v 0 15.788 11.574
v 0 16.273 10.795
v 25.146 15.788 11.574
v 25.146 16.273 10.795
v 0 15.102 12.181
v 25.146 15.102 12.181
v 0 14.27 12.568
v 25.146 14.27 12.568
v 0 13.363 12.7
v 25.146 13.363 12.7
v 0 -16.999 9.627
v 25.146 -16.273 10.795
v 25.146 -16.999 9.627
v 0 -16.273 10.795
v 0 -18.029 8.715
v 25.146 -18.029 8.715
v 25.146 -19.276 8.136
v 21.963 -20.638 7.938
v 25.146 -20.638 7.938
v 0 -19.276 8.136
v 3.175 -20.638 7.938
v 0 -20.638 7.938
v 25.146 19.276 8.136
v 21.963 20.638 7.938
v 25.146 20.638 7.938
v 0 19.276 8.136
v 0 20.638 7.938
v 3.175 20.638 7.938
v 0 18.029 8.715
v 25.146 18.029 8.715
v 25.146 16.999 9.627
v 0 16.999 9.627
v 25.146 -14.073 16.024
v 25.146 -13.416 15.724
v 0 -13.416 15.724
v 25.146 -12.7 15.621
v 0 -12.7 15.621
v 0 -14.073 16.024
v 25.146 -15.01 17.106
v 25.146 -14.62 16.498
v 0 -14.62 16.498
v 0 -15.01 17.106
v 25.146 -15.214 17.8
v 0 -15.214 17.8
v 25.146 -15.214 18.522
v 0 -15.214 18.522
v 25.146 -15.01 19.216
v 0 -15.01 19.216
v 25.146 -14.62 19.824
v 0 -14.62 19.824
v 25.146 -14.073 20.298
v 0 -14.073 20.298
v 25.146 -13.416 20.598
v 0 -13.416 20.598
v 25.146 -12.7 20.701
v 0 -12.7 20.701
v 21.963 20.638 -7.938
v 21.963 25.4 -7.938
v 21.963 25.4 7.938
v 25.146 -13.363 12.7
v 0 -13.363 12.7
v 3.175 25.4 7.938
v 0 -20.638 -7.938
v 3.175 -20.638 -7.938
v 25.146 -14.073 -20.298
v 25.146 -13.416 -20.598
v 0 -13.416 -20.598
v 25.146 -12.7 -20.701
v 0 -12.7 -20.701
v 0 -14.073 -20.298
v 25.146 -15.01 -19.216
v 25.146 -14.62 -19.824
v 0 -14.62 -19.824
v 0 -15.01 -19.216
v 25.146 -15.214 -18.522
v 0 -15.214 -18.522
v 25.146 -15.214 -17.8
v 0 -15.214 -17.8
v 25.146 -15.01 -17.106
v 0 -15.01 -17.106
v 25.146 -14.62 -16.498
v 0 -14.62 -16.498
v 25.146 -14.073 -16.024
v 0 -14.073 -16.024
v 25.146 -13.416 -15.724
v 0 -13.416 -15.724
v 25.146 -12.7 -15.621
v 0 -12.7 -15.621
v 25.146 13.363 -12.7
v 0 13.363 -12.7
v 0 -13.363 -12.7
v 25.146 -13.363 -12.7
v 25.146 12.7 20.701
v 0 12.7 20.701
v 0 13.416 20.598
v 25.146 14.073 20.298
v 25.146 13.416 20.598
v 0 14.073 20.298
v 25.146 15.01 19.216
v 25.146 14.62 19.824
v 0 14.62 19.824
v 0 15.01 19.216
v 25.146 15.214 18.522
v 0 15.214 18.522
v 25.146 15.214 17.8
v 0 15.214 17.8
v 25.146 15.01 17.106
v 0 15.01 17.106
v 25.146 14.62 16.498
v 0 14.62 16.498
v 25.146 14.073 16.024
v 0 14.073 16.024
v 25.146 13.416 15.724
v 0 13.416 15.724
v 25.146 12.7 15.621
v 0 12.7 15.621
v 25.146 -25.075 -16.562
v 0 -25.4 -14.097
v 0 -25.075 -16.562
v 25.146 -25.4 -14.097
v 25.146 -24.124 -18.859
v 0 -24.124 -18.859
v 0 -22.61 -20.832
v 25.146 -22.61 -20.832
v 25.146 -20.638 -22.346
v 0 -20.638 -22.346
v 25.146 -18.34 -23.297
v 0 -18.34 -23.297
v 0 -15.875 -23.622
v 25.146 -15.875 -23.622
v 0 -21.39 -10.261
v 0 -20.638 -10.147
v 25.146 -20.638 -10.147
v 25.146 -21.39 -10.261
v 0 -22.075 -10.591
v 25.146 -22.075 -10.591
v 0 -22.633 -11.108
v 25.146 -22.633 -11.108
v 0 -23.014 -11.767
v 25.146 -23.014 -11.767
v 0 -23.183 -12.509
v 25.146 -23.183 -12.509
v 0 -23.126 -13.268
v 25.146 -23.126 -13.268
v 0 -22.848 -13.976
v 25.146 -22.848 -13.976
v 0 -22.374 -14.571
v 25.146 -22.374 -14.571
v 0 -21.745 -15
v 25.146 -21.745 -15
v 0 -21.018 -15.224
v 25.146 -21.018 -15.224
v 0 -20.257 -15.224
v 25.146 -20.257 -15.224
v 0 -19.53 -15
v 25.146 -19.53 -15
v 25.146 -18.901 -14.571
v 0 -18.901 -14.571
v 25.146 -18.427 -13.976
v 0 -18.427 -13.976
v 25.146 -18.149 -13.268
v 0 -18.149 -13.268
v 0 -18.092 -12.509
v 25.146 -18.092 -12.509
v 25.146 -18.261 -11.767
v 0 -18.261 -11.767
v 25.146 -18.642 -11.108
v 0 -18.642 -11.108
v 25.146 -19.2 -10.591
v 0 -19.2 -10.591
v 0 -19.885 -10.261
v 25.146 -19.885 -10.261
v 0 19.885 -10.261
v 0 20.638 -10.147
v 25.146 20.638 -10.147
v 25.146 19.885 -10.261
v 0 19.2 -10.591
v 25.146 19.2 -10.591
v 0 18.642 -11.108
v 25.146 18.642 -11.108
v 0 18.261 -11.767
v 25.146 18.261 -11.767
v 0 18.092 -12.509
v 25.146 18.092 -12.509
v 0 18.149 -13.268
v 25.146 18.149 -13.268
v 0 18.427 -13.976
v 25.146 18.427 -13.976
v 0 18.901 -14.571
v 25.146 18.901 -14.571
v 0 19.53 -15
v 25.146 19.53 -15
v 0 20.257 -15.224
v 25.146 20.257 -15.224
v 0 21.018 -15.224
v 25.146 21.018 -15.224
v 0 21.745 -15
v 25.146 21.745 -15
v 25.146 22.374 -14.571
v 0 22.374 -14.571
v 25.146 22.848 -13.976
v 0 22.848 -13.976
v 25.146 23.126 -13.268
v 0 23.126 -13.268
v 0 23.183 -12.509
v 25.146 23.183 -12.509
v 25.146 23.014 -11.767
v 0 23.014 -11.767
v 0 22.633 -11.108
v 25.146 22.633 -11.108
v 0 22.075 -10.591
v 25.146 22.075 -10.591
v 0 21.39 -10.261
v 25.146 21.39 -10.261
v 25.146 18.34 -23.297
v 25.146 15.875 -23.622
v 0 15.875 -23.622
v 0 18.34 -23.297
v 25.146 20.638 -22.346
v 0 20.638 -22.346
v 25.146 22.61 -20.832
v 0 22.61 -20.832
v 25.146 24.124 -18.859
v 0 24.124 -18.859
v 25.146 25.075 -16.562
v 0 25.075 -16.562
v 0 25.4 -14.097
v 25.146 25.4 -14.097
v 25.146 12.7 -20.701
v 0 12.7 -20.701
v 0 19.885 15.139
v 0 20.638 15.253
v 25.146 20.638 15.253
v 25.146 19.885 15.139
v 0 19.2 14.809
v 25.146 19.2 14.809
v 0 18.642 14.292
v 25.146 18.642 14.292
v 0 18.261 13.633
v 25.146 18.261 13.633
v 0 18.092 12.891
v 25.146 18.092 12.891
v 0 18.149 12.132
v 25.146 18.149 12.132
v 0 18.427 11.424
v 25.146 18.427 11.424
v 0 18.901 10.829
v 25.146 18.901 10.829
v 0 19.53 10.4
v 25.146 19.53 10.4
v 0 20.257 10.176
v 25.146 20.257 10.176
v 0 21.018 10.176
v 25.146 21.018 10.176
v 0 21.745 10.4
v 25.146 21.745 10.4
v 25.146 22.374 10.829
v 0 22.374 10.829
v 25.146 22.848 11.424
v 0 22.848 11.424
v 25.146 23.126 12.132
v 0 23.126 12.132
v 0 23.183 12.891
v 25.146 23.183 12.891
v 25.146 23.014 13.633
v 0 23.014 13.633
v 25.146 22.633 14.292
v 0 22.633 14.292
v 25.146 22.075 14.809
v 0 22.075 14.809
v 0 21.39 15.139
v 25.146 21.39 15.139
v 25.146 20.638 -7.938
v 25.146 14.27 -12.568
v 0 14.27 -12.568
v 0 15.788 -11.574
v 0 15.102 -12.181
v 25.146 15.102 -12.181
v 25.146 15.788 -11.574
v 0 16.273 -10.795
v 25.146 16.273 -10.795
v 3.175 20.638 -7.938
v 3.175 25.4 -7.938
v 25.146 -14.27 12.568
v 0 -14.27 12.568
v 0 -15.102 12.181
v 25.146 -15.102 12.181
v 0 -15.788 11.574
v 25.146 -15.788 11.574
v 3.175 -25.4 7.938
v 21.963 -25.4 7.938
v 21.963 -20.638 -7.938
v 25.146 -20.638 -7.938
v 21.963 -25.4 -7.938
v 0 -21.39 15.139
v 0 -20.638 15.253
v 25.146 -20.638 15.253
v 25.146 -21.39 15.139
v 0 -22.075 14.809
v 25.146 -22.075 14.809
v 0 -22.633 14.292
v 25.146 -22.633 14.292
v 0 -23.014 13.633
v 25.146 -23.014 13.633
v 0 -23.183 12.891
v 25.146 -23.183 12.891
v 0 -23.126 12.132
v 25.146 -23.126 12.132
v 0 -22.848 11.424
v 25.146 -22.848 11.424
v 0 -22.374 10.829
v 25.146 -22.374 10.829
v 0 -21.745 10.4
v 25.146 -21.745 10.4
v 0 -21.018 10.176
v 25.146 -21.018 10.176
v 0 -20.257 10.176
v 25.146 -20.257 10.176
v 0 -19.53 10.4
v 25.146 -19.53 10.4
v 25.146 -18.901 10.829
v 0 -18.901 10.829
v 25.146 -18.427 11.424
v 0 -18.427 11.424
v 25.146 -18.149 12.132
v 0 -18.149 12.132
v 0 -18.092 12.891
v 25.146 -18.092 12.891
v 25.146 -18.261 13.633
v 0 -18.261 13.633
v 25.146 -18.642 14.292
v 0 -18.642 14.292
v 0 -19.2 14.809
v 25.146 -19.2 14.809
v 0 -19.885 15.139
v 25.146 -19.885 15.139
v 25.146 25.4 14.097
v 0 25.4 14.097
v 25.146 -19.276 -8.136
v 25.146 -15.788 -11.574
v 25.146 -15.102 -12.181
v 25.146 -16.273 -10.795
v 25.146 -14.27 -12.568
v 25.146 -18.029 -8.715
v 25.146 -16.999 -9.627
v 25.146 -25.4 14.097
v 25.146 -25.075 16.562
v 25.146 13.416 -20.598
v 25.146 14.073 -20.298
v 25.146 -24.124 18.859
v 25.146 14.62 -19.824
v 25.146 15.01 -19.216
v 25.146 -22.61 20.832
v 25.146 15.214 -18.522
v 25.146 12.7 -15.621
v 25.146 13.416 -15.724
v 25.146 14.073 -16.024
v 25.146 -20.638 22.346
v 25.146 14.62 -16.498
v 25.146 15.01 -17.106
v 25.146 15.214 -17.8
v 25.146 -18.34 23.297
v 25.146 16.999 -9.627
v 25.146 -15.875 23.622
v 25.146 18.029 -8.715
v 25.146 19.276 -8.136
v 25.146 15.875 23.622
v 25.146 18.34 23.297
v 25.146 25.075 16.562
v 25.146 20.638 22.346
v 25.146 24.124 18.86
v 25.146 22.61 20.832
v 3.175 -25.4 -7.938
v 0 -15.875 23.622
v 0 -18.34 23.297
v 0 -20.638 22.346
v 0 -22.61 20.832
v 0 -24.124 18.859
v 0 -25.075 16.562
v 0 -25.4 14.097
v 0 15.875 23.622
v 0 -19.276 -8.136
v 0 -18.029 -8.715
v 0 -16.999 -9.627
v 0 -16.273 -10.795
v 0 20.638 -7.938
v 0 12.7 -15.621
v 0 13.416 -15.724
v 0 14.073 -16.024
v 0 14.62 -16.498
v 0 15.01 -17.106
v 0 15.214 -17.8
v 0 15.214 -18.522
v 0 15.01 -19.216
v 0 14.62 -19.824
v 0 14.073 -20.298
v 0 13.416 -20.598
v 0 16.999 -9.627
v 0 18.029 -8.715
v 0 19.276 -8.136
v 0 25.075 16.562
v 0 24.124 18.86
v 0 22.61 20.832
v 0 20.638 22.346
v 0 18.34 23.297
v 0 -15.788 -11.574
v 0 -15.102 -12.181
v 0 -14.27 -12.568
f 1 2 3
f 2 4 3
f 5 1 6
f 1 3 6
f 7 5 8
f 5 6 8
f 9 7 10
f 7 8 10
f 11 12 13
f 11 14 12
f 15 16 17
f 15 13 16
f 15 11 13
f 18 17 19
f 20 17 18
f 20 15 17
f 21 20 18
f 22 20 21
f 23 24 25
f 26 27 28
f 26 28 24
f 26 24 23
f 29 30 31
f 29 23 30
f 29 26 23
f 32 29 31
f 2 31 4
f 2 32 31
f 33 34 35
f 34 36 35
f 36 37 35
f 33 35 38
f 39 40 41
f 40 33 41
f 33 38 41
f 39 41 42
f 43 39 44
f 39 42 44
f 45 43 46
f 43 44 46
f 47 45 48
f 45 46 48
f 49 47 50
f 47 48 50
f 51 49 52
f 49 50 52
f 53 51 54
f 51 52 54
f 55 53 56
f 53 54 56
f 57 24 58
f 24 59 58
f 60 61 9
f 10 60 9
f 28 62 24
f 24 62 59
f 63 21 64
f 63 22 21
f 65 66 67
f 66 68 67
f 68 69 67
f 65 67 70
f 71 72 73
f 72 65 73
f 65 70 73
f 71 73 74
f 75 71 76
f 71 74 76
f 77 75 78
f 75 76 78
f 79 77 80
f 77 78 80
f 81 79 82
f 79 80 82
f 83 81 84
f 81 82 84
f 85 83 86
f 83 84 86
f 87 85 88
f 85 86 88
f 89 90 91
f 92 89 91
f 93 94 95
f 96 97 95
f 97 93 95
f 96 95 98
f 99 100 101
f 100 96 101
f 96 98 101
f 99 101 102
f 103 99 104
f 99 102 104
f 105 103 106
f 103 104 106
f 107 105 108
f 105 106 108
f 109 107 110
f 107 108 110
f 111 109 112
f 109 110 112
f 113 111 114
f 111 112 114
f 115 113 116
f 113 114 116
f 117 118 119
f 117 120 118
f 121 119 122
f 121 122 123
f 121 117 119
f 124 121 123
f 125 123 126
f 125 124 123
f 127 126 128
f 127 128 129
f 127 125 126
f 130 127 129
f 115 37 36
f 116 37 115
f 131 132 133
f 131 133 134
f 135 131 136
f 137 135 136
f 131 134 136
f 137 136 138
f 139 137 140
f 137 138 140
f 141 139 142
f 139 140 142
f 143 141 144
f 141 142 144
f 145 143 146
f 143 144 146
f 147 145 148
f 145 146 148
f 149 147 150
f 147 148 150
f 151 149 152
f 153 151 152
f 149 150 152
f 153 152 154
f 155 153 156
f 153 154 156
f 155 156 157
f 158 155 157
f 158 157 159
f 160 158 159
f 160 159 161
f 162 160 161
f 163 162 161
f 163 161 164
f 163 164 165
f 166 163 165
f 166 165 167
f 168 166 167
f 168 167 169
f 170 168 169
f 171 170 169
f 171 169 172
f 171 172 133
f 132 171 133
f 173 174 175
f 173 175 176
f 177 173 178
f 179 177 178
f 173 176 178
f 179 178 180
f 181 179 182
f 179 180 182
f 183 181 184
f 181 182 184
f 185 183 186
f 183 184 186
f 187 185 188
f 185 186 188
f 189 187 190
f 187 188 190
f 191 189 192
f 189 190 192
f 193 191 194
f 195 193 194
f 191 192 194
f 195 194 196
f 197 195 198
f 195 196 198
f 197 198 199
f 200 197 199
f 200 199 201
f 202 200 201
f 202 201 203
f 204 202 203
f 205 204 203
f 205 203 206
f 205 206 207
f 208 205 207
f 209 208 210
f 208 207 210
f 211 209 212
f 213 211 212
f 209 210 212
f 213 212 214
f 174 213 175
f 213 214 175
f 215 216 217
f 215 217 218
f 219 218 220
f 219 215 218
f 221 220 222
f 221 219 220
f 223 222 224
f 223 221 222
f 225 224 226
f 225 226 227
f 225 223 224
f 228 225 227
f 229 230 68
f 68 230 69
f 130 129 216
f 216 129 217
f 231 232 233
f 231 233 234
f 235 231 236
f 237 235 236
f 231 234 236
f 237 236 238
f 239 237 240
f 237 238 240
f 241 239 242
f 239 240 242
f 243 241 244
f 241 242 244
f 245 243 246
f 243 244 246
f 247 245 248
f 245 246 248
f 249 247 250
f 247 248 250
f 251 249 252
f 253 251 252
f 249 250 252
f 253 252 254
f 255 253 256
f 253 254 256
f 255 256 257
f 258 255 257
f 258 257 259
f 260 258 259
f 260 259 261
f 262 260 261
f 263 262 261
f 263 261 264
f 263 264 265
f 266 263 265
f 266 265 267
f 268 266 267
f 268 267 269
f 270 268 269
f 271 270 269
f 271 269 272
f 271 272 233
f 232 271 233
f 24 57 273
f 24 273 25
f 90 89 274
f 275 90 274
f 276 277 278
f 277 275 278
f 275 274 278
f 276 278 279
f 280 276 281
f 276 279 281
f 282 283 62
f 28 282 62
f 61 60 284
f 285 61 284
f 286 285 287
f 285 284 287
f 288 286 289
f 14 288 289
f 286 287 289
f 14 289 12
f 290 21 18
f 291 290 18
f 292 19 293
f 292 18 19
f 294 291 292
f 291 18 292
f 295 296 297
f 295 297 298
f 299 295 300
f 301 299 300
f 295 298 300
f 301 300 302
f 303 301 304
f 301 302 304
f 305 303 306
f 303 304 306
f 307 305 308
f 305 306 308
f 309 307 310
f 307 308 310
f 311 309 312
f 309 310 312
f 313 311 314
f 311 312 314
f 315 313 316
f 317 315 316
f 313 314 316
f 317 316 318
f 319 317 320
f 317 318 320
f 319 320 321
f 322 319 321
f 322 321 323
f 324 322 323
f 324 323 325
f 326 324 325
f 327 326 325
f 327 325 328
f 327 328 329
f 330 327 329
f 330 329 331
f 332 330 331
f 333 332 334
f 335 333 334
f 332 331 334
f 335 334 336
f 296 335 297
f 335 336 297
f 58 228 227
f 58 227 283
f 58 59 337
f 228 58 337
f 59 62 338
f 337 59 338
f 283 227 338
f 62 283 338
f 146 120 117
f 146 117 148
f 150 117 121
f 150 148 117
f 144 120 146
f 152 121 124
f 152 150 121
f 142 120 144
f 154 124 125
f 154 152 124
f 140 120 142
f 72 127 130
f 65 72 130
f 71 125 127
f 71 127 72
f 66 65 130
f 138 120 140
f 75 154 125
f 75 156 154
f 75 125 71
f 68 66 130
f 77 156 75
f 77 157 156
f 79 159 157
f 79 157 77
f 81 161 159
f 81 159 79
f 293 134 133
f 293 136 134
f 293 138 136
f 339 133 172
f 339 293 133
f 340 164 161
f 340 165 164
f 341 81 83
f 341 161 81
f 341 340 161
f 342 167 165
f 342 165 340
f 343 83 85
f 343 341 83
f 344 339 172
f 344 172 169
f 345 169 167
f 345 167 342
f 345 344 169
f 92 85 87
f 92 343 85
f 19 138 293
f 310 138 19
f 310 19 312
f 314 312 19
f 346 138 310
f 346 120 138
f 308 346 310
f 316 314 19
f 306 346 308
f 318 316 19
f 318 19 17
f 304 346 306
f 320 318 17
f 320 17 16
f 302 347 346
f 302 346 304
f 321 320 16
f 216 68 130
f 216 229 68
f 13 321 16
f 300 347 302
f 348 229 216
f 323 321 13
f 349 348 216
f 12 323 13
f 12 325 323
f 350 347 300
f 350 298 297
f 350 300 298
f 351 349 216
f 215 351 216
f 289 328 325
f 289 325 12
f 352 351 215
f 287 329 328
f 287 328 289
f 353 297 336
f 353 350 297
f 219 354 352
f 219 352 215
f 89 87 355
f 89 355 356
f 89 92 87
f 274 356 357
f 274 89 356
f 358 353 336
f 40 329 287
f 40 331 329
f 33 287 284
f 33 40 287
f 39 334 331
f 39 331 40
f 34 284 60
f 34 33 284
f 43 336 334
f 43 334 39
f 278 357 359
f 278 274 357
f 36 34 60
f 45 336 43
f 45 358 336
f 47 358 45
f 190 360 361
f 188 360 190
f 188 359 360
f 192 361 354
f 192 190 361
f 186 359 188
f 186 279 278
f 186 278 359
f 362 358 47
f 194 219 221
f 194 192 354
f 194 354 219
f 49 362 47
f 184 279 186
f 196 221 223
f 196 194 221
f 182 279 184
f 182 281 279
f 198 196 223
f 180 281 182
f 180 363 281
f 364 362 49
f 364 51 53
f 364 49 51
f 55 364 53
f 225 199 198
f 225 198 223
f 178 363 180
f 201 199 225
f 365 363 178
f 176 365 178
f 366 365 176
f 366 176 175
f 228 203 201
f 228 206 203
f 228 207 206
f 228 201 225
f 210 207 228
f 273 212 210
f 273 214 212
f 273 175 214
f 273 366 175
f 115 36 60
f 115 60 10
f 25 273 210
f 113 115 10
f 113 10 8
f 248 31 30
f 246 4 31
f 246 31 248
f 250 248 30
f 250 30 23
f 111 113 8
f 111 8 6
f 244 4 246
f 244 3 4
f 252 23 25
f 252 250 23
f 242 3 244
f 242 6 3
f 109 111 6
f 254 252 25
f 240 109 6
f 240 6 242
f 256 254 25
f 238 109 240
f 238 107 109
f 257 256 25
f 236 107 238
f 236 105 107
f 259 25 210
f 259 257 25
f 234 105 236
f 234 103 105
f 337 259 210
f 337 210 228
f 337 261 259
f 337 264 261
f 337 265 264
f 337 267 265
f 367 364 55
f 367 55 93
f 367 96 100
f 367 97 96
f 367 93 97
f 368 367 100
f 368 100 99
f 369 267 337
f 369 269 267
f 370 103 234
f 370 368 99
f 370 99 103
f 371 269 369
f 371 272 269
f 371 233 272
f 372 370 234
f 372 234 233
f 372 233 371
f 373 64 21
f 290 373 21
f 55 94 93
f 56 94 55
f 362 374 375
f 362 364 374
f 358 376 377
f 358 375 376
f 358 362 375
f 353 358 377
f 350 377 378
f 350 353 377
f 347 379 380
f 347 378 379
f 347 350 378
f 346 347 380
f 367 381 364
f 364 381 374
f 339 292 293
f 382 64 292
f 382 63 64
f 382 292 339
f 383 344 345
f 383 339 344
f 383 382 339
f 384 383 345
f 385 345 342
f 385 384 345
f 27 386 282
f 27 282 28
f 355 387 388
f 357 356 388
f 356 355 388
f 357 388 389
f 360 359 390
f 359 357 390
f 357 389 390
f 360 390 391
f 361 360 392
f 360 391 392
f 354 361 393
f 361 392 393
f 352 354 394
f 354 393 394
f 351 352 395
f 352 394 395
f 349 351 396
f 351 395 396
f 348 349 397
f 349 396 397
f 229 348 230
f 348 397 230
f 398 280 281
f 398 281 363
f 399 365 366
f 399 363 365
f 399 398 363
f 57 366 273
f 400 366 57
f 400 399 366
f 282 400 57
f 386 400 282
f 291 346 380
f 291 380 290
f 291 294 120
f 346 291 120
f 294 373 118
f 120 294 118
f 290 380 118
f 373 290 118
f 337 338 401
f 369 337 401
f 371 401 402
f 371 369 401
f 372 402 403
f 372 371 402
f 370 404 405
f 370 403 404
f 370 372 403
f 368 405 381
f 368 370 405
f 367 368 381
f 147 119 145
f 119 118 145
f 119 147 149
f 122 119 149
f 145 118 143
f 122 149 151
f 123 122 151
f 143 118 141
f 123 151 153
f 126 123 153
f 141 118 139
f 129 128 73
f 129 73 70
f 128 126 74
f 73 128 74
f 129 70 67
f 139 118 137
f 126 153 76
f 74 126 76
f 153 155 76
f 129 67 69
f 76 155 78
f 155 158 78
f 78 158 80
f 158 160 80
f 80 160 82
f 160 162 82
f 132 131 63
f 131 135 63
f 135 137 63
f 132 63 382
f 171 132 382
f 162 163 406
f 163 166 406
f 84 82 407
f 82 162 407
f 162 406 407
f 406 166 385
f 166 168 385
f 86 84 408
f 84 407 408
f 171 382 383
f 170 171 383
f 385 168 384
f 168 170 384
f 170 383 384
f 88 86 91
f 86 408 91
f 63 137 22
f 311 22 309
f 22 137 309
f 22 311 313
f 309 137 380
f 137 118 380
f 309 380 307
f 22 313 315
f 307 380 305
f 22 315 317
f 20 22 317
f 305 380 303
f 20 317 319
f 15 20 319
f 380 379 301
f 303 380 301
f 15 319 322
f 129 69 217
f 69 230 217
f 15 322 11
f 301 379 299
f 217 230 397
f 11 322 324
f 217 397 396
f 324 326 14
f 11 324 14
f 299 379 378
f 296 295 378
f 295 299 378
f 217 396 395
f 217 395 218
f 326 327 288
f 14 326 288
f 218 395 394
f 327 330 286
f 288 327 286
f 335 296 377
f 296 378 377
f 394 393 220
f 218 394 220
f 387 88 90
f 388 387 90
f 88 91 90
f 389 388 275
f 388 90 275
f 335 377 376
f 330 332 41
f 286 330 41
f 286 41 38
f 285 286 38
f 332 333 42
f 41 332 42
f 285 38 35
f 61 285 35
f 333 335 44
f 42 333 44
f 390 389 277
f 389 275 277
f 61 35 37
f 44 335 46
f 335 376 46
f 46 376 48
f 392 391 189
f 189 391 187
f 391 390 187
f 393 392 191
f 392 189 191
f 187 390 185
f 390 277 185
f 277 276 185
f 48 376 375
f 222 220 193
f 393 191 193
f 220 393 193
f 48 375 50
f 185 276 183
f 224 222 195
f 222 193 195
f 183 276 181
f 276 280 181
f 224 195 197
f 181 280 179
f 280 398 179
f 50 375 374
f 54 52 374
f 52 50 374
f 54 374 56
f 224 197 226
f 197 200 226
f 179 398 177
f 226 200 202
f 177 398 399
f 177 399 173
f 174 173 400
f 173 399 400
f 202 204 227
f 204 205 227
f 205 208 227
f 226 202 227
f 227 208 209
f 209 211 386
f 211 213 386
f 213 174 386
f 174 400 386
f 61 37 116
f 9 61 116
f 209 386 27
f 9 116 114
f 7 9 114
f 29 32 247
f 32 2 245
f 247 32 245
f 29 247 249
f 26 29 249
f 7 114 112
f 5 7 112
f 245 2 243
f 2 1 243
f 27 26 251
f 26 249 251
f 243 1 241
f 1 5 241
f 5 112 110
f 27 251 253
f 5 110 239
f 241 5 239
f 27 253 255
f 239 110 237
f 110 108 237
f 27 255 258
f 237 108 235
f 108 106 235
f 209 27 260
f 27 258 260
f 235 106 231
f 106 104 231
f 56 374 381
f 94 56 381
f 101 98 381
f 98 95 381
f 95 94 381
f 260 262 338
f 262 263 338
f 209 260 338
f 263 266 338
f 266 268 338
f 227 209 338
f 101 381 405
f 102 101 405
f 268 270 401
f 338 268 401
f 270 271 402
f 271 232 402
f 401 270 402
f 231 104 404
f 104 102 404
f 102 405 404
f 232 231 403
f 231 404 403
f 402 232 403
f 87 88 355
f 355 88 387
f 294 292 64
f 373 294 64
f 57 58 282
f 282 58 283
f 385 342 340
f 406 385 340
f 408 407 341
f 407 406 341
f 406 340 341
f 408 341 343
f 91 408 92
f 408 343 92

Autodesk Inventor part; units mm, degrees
ref_plane "YZ Plane" through (0, 0, 0) normal (1, 0, 0) x (0, 1, 0)
ref_plane "XZ Plane" through (0, 0, 0) normal (0, 1, 0) x (-1, 0, 0)
ref_plane "XY Plane" through (0, 0, 0) normal (0, 0, 1) x (1, 0, 0)
sketch "Sketch1" plane through (0, 0, 0) normal (1, 0, 0) x (0, 1, 0)
  line L0 (-20.6375, -12.7) -> (20.6375, -12.7) construction
  line L1 (20.6375, -12.7) -> (20.6375, 12.7) construction
  line L2 (20.6375, 12.7) -> (-20.6375, 12.7) construction
  line L3 (-20.6375, 12.7) -> (-20.6375, -12.7) construction
  line L4 (-20.6375, -12.7) -> (20.6375, 12.7) construction
  line L5 (20.6375, -12.7) -> (-20.6375, 12.7) construction
  circle A0 centre (-20.6375, 12.7) radius 4.7625 construction
  circle A1 centre (-20.6375, -12.7) radius 4.7625 construction
  circle A2 centre (20.6375, -12.7) radius 4.7625 construction
  circle A3 centre (20.6375, 12.7) radius 4.7625 construction
  line L6 (-25.4, -23.622) -> (25.4, -23.622)
  line L7 (25.4, -23.622) -> (25.4, 23.622)
  line L8 (25.4, 23.622) -> (-25.4, 23.622)
  line L9 (-25.4, 23.622) -> (-25.4, -23.622)
  line L10 (-25.4, -23.622) -> (25.4, 23.622) construction
  line L11 (25.4, -23.622) -> (-25.4, 23.622) construction
  line L12 (20.6375, -7.9375) -> (20.6375, 7.9375)
  line L13 (15.875, -12.7) -> (-15.875, -12.7)
  line L14 (-20.6375, 7.9375) -> (-20.6375, -7.9375)
  line L15 (-15.875, 12.7) -> (15.875, 12.7)
  arc A4 (15.875, 12.7) -> (20.6375, 7.9375) centre (20.6375, 12.7) ccw
  arc A5 (20.6375, -7.9375) -> (15.875, -12.7) centre (20.6375, -12.7) ccw
  arc A6 (-15.875, -12.7) -> (-20.6375, -7.9375) centre (-20.6375, -12.7) ccw
  arc A7 (-20.6375, 7.9375) -> (-15.875, 12.7) centre (-20.6375, 12.7) ccw
  line L16 (12.7, 18.161) -> (-12.7, 18.161) construction
  line L17 (12.7, 20.701) -> (-12.7, 20.701)
  line L18 (-12.7, 15.621) -> (12.7, 15.621)
  arc A8 (12.7, 15.621) -> (12.7, 20.701) centre (12.7, 18.161) ccw
  arc A9 (-12.7, 20.701) -> (-12.7, 15.621) centre (-12.7, 18.161) ccw
  line L19 (12.7, -18.161) -> (-12.7, -18.161) construction
  line L20 (12.7, -20.701) -> (-12.7, -20.701)
  line L21 (-12.7, -15.621) -> (12.7, -15.621)
  arc A10 (12.7, -20.701) -> (12.7, -15.621) centre (12.7, -18.161) ccw
  arc A11 (-12.7, -15.621) -> (-12.7, -20.701) centre (-12.7, -18.161) ccw
  line L22 (0, 23.622) -> (0, 12.7) construction
  line L23 (0, -12.7) -> (0, -23.622) construction
  point P0 (0, 0)
  point P1 (0, 18.161)
  point P2 (0, -18.161)
  point P3 (0, 18.161)
  point P4 (0, -18.161)
  dimension "d0" = 25.4
  dimension "d1" = 41.275
  dimension "d2" = 9.525
  dimension "d3" = 47.244
  dimension "d4" = 2.54
  dimension "d5" = 25.4
extrude "Extrusion1" add sketch "Sketch1" along normal blind 25.146
hole "Hole1" at (0, 20.6375, 12.7) at (0, 20.6375, -12.7) at (0, -20.6375, -12.7) at (0, -20.6375, 12.7) direction (1, 0, 0) diameter 5.1054 end through all clearance for "Flat Head Machine Screw (82)" size "#10" standard "Ansi Unified Screw Threads"
sketch "Sketch2" plane through (0, 25.4, 23.622) normal (0, 1, 0) x (1, 0, 0)
  point P0 (0, 23.622)
sketch "Sketch3" plane through (0, 25.4, 23.622) normal (0, 1, 0) x (1, 0, 0)
  line L0 (3.175, 15.6845) -> (21.9634, 15.6845)
  line L1 (21.9634, 15.6845) -> (21.9634, 31.5595)
  line L2 (21.9634, 31.5595) -> (3.175, 31.5595)
  line L3 (3.175, 31.5595) -> (3.175, 15.6845)
  line L4 (3.175, 15.6845) -> (21.9634, 31.5595) construction
  line L5 (21.9634, 15.6845) -> (3.175, 31.5595) construction
  line L6 (0, 47.244) -> (0, 0) construction
  line L7 (25.146, 47.244) -> (25.146, 0) construction
  line L8 (0, 15.6845) -> (25.146, 15.6845) construction
  point P0 (0, 23.622)
  point P1 (12.5692, 23.622)
  point P2 (21.9634, 23.622)
  point P3 (3.175, 23.622)
  point P4 (0, 23.622)
  point P5 (0, 23.622)
  point P6 (25.146, 23.622)
  dimension "d16" = 3.175
  dimension "d17" = 3.1826
extrude "Extrusion2" cut sketch "Sketch3" against normal through all
fillet "Fillet1" radius 3.175 4 edges at (12.573, 15.875, 12.7) (12.573, 15.875, -12.7) (12.573, -15.875, -12.7) (12.573, -15.875, 12.7)
fillet "Fillet2" radius 9.525 4 edges at (12.573, -25.4, -23.622) (12.573, -25.4, 23.622) (12.573, 25.4, 23.622) (12.573, 25.4, -23.622)
properties part number "EL2-022" material "ABS Plastic"
